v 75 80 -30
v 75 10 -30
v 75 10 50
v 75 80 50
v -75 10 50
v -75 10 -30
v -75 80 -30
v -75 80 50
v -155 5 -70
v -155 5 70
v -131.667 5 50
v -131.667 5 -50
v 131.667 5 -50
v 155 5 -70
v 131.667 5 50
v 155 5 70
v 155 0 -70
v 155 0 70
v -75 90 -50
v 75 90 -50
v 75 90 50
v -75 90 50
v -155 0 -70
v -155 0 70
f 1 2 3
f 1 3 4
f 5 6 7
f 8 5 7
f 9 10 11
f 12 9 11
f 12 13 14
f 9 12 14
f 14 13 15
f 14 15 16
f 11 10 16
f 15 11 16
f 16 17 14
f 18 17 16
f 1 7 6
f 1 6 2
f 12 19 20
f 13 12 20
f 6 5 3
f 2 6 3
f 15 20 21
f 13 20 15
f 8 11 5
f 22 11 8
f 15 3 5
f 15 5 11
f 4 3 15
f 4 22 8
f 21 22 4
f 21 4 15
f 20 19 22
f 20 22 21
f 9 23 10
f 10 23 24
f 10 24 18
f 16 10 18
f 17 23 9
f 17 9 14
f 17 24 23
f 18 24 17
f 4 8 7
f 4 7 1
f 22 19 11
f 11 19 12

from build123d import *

# Parameters (mm, degrees)
SKETCH_2_W          = 150
SKETCH_2_H          = 100
EXTRUDE_1_DEPTH     = 90
SKETCH_3_W          = 150
SKETCH_3_H          = 70
CUT_EXTRUDE_1_DEPTH = 80
EXTRUDE_2_DEPTH     = 100
EXTRUDE_3_DEPTH     = 100
SKETCH_7_W          = 310
SKETCH_7_H          = 140
EXTRUDE_4_DEPTH     = 5


with BuildPart() as part:
    # 草图2 → 凸台-拉伸1 (new body)
    with BuildSketch(Plane(origin=(0, 0, 0), x_dir=(1, 0, 0), z_dir=(0, 1, 0))):
        Rectangle(SKETCH_2_W, SKETCH_2_H)
    extrude(amount=EXTRUDE_1_DEPTH)

    # 草图3 → 切除-拉伸1 (cut)
    with BuildSketch(Plane.XY.offset(50)):
        with Locations((0, 45)):
            Rectangle(SKETCH_3_W, SKETCH_3_H)
    extrude(amount=-CUT_EXTRUDE_1_DEPTH, mode=Mode.SUBTRACT)

    # 草图5 → 凸台-拉伸2 (add)
    with BuildSketch(Plane(origin=(0, 0, -50), x_dir=(-1, 0, 0), z_dir=(0, 0, -1))):
        Polygon((-75, 90), (-135, 0), (-75, 0), align=None)
    extrude(amount=-EXTRUDE_2_DEPTH)

    # 草图6 → 凸台-拉伸3 (add)
    with BuildSketch(Plane(origin=(0, 0, -50), x_dir=(-1, 0, 0), z_dir=(0, 0, -1))):
        Polygon((75, 90), (135, 0), (75, 0), align=None)
    extrude(amount=-EXTRUDE_3_DEPTH)

    # 草图7 → 凸台-拉伸4 (add)
    with BuildSketch(Plane.XZ):
        Rectangle(SKETCH_7_W, SKETCH_7_H)
    extrude(amount=-EXTRUDE_4_DEPTH)


solid = part.part
